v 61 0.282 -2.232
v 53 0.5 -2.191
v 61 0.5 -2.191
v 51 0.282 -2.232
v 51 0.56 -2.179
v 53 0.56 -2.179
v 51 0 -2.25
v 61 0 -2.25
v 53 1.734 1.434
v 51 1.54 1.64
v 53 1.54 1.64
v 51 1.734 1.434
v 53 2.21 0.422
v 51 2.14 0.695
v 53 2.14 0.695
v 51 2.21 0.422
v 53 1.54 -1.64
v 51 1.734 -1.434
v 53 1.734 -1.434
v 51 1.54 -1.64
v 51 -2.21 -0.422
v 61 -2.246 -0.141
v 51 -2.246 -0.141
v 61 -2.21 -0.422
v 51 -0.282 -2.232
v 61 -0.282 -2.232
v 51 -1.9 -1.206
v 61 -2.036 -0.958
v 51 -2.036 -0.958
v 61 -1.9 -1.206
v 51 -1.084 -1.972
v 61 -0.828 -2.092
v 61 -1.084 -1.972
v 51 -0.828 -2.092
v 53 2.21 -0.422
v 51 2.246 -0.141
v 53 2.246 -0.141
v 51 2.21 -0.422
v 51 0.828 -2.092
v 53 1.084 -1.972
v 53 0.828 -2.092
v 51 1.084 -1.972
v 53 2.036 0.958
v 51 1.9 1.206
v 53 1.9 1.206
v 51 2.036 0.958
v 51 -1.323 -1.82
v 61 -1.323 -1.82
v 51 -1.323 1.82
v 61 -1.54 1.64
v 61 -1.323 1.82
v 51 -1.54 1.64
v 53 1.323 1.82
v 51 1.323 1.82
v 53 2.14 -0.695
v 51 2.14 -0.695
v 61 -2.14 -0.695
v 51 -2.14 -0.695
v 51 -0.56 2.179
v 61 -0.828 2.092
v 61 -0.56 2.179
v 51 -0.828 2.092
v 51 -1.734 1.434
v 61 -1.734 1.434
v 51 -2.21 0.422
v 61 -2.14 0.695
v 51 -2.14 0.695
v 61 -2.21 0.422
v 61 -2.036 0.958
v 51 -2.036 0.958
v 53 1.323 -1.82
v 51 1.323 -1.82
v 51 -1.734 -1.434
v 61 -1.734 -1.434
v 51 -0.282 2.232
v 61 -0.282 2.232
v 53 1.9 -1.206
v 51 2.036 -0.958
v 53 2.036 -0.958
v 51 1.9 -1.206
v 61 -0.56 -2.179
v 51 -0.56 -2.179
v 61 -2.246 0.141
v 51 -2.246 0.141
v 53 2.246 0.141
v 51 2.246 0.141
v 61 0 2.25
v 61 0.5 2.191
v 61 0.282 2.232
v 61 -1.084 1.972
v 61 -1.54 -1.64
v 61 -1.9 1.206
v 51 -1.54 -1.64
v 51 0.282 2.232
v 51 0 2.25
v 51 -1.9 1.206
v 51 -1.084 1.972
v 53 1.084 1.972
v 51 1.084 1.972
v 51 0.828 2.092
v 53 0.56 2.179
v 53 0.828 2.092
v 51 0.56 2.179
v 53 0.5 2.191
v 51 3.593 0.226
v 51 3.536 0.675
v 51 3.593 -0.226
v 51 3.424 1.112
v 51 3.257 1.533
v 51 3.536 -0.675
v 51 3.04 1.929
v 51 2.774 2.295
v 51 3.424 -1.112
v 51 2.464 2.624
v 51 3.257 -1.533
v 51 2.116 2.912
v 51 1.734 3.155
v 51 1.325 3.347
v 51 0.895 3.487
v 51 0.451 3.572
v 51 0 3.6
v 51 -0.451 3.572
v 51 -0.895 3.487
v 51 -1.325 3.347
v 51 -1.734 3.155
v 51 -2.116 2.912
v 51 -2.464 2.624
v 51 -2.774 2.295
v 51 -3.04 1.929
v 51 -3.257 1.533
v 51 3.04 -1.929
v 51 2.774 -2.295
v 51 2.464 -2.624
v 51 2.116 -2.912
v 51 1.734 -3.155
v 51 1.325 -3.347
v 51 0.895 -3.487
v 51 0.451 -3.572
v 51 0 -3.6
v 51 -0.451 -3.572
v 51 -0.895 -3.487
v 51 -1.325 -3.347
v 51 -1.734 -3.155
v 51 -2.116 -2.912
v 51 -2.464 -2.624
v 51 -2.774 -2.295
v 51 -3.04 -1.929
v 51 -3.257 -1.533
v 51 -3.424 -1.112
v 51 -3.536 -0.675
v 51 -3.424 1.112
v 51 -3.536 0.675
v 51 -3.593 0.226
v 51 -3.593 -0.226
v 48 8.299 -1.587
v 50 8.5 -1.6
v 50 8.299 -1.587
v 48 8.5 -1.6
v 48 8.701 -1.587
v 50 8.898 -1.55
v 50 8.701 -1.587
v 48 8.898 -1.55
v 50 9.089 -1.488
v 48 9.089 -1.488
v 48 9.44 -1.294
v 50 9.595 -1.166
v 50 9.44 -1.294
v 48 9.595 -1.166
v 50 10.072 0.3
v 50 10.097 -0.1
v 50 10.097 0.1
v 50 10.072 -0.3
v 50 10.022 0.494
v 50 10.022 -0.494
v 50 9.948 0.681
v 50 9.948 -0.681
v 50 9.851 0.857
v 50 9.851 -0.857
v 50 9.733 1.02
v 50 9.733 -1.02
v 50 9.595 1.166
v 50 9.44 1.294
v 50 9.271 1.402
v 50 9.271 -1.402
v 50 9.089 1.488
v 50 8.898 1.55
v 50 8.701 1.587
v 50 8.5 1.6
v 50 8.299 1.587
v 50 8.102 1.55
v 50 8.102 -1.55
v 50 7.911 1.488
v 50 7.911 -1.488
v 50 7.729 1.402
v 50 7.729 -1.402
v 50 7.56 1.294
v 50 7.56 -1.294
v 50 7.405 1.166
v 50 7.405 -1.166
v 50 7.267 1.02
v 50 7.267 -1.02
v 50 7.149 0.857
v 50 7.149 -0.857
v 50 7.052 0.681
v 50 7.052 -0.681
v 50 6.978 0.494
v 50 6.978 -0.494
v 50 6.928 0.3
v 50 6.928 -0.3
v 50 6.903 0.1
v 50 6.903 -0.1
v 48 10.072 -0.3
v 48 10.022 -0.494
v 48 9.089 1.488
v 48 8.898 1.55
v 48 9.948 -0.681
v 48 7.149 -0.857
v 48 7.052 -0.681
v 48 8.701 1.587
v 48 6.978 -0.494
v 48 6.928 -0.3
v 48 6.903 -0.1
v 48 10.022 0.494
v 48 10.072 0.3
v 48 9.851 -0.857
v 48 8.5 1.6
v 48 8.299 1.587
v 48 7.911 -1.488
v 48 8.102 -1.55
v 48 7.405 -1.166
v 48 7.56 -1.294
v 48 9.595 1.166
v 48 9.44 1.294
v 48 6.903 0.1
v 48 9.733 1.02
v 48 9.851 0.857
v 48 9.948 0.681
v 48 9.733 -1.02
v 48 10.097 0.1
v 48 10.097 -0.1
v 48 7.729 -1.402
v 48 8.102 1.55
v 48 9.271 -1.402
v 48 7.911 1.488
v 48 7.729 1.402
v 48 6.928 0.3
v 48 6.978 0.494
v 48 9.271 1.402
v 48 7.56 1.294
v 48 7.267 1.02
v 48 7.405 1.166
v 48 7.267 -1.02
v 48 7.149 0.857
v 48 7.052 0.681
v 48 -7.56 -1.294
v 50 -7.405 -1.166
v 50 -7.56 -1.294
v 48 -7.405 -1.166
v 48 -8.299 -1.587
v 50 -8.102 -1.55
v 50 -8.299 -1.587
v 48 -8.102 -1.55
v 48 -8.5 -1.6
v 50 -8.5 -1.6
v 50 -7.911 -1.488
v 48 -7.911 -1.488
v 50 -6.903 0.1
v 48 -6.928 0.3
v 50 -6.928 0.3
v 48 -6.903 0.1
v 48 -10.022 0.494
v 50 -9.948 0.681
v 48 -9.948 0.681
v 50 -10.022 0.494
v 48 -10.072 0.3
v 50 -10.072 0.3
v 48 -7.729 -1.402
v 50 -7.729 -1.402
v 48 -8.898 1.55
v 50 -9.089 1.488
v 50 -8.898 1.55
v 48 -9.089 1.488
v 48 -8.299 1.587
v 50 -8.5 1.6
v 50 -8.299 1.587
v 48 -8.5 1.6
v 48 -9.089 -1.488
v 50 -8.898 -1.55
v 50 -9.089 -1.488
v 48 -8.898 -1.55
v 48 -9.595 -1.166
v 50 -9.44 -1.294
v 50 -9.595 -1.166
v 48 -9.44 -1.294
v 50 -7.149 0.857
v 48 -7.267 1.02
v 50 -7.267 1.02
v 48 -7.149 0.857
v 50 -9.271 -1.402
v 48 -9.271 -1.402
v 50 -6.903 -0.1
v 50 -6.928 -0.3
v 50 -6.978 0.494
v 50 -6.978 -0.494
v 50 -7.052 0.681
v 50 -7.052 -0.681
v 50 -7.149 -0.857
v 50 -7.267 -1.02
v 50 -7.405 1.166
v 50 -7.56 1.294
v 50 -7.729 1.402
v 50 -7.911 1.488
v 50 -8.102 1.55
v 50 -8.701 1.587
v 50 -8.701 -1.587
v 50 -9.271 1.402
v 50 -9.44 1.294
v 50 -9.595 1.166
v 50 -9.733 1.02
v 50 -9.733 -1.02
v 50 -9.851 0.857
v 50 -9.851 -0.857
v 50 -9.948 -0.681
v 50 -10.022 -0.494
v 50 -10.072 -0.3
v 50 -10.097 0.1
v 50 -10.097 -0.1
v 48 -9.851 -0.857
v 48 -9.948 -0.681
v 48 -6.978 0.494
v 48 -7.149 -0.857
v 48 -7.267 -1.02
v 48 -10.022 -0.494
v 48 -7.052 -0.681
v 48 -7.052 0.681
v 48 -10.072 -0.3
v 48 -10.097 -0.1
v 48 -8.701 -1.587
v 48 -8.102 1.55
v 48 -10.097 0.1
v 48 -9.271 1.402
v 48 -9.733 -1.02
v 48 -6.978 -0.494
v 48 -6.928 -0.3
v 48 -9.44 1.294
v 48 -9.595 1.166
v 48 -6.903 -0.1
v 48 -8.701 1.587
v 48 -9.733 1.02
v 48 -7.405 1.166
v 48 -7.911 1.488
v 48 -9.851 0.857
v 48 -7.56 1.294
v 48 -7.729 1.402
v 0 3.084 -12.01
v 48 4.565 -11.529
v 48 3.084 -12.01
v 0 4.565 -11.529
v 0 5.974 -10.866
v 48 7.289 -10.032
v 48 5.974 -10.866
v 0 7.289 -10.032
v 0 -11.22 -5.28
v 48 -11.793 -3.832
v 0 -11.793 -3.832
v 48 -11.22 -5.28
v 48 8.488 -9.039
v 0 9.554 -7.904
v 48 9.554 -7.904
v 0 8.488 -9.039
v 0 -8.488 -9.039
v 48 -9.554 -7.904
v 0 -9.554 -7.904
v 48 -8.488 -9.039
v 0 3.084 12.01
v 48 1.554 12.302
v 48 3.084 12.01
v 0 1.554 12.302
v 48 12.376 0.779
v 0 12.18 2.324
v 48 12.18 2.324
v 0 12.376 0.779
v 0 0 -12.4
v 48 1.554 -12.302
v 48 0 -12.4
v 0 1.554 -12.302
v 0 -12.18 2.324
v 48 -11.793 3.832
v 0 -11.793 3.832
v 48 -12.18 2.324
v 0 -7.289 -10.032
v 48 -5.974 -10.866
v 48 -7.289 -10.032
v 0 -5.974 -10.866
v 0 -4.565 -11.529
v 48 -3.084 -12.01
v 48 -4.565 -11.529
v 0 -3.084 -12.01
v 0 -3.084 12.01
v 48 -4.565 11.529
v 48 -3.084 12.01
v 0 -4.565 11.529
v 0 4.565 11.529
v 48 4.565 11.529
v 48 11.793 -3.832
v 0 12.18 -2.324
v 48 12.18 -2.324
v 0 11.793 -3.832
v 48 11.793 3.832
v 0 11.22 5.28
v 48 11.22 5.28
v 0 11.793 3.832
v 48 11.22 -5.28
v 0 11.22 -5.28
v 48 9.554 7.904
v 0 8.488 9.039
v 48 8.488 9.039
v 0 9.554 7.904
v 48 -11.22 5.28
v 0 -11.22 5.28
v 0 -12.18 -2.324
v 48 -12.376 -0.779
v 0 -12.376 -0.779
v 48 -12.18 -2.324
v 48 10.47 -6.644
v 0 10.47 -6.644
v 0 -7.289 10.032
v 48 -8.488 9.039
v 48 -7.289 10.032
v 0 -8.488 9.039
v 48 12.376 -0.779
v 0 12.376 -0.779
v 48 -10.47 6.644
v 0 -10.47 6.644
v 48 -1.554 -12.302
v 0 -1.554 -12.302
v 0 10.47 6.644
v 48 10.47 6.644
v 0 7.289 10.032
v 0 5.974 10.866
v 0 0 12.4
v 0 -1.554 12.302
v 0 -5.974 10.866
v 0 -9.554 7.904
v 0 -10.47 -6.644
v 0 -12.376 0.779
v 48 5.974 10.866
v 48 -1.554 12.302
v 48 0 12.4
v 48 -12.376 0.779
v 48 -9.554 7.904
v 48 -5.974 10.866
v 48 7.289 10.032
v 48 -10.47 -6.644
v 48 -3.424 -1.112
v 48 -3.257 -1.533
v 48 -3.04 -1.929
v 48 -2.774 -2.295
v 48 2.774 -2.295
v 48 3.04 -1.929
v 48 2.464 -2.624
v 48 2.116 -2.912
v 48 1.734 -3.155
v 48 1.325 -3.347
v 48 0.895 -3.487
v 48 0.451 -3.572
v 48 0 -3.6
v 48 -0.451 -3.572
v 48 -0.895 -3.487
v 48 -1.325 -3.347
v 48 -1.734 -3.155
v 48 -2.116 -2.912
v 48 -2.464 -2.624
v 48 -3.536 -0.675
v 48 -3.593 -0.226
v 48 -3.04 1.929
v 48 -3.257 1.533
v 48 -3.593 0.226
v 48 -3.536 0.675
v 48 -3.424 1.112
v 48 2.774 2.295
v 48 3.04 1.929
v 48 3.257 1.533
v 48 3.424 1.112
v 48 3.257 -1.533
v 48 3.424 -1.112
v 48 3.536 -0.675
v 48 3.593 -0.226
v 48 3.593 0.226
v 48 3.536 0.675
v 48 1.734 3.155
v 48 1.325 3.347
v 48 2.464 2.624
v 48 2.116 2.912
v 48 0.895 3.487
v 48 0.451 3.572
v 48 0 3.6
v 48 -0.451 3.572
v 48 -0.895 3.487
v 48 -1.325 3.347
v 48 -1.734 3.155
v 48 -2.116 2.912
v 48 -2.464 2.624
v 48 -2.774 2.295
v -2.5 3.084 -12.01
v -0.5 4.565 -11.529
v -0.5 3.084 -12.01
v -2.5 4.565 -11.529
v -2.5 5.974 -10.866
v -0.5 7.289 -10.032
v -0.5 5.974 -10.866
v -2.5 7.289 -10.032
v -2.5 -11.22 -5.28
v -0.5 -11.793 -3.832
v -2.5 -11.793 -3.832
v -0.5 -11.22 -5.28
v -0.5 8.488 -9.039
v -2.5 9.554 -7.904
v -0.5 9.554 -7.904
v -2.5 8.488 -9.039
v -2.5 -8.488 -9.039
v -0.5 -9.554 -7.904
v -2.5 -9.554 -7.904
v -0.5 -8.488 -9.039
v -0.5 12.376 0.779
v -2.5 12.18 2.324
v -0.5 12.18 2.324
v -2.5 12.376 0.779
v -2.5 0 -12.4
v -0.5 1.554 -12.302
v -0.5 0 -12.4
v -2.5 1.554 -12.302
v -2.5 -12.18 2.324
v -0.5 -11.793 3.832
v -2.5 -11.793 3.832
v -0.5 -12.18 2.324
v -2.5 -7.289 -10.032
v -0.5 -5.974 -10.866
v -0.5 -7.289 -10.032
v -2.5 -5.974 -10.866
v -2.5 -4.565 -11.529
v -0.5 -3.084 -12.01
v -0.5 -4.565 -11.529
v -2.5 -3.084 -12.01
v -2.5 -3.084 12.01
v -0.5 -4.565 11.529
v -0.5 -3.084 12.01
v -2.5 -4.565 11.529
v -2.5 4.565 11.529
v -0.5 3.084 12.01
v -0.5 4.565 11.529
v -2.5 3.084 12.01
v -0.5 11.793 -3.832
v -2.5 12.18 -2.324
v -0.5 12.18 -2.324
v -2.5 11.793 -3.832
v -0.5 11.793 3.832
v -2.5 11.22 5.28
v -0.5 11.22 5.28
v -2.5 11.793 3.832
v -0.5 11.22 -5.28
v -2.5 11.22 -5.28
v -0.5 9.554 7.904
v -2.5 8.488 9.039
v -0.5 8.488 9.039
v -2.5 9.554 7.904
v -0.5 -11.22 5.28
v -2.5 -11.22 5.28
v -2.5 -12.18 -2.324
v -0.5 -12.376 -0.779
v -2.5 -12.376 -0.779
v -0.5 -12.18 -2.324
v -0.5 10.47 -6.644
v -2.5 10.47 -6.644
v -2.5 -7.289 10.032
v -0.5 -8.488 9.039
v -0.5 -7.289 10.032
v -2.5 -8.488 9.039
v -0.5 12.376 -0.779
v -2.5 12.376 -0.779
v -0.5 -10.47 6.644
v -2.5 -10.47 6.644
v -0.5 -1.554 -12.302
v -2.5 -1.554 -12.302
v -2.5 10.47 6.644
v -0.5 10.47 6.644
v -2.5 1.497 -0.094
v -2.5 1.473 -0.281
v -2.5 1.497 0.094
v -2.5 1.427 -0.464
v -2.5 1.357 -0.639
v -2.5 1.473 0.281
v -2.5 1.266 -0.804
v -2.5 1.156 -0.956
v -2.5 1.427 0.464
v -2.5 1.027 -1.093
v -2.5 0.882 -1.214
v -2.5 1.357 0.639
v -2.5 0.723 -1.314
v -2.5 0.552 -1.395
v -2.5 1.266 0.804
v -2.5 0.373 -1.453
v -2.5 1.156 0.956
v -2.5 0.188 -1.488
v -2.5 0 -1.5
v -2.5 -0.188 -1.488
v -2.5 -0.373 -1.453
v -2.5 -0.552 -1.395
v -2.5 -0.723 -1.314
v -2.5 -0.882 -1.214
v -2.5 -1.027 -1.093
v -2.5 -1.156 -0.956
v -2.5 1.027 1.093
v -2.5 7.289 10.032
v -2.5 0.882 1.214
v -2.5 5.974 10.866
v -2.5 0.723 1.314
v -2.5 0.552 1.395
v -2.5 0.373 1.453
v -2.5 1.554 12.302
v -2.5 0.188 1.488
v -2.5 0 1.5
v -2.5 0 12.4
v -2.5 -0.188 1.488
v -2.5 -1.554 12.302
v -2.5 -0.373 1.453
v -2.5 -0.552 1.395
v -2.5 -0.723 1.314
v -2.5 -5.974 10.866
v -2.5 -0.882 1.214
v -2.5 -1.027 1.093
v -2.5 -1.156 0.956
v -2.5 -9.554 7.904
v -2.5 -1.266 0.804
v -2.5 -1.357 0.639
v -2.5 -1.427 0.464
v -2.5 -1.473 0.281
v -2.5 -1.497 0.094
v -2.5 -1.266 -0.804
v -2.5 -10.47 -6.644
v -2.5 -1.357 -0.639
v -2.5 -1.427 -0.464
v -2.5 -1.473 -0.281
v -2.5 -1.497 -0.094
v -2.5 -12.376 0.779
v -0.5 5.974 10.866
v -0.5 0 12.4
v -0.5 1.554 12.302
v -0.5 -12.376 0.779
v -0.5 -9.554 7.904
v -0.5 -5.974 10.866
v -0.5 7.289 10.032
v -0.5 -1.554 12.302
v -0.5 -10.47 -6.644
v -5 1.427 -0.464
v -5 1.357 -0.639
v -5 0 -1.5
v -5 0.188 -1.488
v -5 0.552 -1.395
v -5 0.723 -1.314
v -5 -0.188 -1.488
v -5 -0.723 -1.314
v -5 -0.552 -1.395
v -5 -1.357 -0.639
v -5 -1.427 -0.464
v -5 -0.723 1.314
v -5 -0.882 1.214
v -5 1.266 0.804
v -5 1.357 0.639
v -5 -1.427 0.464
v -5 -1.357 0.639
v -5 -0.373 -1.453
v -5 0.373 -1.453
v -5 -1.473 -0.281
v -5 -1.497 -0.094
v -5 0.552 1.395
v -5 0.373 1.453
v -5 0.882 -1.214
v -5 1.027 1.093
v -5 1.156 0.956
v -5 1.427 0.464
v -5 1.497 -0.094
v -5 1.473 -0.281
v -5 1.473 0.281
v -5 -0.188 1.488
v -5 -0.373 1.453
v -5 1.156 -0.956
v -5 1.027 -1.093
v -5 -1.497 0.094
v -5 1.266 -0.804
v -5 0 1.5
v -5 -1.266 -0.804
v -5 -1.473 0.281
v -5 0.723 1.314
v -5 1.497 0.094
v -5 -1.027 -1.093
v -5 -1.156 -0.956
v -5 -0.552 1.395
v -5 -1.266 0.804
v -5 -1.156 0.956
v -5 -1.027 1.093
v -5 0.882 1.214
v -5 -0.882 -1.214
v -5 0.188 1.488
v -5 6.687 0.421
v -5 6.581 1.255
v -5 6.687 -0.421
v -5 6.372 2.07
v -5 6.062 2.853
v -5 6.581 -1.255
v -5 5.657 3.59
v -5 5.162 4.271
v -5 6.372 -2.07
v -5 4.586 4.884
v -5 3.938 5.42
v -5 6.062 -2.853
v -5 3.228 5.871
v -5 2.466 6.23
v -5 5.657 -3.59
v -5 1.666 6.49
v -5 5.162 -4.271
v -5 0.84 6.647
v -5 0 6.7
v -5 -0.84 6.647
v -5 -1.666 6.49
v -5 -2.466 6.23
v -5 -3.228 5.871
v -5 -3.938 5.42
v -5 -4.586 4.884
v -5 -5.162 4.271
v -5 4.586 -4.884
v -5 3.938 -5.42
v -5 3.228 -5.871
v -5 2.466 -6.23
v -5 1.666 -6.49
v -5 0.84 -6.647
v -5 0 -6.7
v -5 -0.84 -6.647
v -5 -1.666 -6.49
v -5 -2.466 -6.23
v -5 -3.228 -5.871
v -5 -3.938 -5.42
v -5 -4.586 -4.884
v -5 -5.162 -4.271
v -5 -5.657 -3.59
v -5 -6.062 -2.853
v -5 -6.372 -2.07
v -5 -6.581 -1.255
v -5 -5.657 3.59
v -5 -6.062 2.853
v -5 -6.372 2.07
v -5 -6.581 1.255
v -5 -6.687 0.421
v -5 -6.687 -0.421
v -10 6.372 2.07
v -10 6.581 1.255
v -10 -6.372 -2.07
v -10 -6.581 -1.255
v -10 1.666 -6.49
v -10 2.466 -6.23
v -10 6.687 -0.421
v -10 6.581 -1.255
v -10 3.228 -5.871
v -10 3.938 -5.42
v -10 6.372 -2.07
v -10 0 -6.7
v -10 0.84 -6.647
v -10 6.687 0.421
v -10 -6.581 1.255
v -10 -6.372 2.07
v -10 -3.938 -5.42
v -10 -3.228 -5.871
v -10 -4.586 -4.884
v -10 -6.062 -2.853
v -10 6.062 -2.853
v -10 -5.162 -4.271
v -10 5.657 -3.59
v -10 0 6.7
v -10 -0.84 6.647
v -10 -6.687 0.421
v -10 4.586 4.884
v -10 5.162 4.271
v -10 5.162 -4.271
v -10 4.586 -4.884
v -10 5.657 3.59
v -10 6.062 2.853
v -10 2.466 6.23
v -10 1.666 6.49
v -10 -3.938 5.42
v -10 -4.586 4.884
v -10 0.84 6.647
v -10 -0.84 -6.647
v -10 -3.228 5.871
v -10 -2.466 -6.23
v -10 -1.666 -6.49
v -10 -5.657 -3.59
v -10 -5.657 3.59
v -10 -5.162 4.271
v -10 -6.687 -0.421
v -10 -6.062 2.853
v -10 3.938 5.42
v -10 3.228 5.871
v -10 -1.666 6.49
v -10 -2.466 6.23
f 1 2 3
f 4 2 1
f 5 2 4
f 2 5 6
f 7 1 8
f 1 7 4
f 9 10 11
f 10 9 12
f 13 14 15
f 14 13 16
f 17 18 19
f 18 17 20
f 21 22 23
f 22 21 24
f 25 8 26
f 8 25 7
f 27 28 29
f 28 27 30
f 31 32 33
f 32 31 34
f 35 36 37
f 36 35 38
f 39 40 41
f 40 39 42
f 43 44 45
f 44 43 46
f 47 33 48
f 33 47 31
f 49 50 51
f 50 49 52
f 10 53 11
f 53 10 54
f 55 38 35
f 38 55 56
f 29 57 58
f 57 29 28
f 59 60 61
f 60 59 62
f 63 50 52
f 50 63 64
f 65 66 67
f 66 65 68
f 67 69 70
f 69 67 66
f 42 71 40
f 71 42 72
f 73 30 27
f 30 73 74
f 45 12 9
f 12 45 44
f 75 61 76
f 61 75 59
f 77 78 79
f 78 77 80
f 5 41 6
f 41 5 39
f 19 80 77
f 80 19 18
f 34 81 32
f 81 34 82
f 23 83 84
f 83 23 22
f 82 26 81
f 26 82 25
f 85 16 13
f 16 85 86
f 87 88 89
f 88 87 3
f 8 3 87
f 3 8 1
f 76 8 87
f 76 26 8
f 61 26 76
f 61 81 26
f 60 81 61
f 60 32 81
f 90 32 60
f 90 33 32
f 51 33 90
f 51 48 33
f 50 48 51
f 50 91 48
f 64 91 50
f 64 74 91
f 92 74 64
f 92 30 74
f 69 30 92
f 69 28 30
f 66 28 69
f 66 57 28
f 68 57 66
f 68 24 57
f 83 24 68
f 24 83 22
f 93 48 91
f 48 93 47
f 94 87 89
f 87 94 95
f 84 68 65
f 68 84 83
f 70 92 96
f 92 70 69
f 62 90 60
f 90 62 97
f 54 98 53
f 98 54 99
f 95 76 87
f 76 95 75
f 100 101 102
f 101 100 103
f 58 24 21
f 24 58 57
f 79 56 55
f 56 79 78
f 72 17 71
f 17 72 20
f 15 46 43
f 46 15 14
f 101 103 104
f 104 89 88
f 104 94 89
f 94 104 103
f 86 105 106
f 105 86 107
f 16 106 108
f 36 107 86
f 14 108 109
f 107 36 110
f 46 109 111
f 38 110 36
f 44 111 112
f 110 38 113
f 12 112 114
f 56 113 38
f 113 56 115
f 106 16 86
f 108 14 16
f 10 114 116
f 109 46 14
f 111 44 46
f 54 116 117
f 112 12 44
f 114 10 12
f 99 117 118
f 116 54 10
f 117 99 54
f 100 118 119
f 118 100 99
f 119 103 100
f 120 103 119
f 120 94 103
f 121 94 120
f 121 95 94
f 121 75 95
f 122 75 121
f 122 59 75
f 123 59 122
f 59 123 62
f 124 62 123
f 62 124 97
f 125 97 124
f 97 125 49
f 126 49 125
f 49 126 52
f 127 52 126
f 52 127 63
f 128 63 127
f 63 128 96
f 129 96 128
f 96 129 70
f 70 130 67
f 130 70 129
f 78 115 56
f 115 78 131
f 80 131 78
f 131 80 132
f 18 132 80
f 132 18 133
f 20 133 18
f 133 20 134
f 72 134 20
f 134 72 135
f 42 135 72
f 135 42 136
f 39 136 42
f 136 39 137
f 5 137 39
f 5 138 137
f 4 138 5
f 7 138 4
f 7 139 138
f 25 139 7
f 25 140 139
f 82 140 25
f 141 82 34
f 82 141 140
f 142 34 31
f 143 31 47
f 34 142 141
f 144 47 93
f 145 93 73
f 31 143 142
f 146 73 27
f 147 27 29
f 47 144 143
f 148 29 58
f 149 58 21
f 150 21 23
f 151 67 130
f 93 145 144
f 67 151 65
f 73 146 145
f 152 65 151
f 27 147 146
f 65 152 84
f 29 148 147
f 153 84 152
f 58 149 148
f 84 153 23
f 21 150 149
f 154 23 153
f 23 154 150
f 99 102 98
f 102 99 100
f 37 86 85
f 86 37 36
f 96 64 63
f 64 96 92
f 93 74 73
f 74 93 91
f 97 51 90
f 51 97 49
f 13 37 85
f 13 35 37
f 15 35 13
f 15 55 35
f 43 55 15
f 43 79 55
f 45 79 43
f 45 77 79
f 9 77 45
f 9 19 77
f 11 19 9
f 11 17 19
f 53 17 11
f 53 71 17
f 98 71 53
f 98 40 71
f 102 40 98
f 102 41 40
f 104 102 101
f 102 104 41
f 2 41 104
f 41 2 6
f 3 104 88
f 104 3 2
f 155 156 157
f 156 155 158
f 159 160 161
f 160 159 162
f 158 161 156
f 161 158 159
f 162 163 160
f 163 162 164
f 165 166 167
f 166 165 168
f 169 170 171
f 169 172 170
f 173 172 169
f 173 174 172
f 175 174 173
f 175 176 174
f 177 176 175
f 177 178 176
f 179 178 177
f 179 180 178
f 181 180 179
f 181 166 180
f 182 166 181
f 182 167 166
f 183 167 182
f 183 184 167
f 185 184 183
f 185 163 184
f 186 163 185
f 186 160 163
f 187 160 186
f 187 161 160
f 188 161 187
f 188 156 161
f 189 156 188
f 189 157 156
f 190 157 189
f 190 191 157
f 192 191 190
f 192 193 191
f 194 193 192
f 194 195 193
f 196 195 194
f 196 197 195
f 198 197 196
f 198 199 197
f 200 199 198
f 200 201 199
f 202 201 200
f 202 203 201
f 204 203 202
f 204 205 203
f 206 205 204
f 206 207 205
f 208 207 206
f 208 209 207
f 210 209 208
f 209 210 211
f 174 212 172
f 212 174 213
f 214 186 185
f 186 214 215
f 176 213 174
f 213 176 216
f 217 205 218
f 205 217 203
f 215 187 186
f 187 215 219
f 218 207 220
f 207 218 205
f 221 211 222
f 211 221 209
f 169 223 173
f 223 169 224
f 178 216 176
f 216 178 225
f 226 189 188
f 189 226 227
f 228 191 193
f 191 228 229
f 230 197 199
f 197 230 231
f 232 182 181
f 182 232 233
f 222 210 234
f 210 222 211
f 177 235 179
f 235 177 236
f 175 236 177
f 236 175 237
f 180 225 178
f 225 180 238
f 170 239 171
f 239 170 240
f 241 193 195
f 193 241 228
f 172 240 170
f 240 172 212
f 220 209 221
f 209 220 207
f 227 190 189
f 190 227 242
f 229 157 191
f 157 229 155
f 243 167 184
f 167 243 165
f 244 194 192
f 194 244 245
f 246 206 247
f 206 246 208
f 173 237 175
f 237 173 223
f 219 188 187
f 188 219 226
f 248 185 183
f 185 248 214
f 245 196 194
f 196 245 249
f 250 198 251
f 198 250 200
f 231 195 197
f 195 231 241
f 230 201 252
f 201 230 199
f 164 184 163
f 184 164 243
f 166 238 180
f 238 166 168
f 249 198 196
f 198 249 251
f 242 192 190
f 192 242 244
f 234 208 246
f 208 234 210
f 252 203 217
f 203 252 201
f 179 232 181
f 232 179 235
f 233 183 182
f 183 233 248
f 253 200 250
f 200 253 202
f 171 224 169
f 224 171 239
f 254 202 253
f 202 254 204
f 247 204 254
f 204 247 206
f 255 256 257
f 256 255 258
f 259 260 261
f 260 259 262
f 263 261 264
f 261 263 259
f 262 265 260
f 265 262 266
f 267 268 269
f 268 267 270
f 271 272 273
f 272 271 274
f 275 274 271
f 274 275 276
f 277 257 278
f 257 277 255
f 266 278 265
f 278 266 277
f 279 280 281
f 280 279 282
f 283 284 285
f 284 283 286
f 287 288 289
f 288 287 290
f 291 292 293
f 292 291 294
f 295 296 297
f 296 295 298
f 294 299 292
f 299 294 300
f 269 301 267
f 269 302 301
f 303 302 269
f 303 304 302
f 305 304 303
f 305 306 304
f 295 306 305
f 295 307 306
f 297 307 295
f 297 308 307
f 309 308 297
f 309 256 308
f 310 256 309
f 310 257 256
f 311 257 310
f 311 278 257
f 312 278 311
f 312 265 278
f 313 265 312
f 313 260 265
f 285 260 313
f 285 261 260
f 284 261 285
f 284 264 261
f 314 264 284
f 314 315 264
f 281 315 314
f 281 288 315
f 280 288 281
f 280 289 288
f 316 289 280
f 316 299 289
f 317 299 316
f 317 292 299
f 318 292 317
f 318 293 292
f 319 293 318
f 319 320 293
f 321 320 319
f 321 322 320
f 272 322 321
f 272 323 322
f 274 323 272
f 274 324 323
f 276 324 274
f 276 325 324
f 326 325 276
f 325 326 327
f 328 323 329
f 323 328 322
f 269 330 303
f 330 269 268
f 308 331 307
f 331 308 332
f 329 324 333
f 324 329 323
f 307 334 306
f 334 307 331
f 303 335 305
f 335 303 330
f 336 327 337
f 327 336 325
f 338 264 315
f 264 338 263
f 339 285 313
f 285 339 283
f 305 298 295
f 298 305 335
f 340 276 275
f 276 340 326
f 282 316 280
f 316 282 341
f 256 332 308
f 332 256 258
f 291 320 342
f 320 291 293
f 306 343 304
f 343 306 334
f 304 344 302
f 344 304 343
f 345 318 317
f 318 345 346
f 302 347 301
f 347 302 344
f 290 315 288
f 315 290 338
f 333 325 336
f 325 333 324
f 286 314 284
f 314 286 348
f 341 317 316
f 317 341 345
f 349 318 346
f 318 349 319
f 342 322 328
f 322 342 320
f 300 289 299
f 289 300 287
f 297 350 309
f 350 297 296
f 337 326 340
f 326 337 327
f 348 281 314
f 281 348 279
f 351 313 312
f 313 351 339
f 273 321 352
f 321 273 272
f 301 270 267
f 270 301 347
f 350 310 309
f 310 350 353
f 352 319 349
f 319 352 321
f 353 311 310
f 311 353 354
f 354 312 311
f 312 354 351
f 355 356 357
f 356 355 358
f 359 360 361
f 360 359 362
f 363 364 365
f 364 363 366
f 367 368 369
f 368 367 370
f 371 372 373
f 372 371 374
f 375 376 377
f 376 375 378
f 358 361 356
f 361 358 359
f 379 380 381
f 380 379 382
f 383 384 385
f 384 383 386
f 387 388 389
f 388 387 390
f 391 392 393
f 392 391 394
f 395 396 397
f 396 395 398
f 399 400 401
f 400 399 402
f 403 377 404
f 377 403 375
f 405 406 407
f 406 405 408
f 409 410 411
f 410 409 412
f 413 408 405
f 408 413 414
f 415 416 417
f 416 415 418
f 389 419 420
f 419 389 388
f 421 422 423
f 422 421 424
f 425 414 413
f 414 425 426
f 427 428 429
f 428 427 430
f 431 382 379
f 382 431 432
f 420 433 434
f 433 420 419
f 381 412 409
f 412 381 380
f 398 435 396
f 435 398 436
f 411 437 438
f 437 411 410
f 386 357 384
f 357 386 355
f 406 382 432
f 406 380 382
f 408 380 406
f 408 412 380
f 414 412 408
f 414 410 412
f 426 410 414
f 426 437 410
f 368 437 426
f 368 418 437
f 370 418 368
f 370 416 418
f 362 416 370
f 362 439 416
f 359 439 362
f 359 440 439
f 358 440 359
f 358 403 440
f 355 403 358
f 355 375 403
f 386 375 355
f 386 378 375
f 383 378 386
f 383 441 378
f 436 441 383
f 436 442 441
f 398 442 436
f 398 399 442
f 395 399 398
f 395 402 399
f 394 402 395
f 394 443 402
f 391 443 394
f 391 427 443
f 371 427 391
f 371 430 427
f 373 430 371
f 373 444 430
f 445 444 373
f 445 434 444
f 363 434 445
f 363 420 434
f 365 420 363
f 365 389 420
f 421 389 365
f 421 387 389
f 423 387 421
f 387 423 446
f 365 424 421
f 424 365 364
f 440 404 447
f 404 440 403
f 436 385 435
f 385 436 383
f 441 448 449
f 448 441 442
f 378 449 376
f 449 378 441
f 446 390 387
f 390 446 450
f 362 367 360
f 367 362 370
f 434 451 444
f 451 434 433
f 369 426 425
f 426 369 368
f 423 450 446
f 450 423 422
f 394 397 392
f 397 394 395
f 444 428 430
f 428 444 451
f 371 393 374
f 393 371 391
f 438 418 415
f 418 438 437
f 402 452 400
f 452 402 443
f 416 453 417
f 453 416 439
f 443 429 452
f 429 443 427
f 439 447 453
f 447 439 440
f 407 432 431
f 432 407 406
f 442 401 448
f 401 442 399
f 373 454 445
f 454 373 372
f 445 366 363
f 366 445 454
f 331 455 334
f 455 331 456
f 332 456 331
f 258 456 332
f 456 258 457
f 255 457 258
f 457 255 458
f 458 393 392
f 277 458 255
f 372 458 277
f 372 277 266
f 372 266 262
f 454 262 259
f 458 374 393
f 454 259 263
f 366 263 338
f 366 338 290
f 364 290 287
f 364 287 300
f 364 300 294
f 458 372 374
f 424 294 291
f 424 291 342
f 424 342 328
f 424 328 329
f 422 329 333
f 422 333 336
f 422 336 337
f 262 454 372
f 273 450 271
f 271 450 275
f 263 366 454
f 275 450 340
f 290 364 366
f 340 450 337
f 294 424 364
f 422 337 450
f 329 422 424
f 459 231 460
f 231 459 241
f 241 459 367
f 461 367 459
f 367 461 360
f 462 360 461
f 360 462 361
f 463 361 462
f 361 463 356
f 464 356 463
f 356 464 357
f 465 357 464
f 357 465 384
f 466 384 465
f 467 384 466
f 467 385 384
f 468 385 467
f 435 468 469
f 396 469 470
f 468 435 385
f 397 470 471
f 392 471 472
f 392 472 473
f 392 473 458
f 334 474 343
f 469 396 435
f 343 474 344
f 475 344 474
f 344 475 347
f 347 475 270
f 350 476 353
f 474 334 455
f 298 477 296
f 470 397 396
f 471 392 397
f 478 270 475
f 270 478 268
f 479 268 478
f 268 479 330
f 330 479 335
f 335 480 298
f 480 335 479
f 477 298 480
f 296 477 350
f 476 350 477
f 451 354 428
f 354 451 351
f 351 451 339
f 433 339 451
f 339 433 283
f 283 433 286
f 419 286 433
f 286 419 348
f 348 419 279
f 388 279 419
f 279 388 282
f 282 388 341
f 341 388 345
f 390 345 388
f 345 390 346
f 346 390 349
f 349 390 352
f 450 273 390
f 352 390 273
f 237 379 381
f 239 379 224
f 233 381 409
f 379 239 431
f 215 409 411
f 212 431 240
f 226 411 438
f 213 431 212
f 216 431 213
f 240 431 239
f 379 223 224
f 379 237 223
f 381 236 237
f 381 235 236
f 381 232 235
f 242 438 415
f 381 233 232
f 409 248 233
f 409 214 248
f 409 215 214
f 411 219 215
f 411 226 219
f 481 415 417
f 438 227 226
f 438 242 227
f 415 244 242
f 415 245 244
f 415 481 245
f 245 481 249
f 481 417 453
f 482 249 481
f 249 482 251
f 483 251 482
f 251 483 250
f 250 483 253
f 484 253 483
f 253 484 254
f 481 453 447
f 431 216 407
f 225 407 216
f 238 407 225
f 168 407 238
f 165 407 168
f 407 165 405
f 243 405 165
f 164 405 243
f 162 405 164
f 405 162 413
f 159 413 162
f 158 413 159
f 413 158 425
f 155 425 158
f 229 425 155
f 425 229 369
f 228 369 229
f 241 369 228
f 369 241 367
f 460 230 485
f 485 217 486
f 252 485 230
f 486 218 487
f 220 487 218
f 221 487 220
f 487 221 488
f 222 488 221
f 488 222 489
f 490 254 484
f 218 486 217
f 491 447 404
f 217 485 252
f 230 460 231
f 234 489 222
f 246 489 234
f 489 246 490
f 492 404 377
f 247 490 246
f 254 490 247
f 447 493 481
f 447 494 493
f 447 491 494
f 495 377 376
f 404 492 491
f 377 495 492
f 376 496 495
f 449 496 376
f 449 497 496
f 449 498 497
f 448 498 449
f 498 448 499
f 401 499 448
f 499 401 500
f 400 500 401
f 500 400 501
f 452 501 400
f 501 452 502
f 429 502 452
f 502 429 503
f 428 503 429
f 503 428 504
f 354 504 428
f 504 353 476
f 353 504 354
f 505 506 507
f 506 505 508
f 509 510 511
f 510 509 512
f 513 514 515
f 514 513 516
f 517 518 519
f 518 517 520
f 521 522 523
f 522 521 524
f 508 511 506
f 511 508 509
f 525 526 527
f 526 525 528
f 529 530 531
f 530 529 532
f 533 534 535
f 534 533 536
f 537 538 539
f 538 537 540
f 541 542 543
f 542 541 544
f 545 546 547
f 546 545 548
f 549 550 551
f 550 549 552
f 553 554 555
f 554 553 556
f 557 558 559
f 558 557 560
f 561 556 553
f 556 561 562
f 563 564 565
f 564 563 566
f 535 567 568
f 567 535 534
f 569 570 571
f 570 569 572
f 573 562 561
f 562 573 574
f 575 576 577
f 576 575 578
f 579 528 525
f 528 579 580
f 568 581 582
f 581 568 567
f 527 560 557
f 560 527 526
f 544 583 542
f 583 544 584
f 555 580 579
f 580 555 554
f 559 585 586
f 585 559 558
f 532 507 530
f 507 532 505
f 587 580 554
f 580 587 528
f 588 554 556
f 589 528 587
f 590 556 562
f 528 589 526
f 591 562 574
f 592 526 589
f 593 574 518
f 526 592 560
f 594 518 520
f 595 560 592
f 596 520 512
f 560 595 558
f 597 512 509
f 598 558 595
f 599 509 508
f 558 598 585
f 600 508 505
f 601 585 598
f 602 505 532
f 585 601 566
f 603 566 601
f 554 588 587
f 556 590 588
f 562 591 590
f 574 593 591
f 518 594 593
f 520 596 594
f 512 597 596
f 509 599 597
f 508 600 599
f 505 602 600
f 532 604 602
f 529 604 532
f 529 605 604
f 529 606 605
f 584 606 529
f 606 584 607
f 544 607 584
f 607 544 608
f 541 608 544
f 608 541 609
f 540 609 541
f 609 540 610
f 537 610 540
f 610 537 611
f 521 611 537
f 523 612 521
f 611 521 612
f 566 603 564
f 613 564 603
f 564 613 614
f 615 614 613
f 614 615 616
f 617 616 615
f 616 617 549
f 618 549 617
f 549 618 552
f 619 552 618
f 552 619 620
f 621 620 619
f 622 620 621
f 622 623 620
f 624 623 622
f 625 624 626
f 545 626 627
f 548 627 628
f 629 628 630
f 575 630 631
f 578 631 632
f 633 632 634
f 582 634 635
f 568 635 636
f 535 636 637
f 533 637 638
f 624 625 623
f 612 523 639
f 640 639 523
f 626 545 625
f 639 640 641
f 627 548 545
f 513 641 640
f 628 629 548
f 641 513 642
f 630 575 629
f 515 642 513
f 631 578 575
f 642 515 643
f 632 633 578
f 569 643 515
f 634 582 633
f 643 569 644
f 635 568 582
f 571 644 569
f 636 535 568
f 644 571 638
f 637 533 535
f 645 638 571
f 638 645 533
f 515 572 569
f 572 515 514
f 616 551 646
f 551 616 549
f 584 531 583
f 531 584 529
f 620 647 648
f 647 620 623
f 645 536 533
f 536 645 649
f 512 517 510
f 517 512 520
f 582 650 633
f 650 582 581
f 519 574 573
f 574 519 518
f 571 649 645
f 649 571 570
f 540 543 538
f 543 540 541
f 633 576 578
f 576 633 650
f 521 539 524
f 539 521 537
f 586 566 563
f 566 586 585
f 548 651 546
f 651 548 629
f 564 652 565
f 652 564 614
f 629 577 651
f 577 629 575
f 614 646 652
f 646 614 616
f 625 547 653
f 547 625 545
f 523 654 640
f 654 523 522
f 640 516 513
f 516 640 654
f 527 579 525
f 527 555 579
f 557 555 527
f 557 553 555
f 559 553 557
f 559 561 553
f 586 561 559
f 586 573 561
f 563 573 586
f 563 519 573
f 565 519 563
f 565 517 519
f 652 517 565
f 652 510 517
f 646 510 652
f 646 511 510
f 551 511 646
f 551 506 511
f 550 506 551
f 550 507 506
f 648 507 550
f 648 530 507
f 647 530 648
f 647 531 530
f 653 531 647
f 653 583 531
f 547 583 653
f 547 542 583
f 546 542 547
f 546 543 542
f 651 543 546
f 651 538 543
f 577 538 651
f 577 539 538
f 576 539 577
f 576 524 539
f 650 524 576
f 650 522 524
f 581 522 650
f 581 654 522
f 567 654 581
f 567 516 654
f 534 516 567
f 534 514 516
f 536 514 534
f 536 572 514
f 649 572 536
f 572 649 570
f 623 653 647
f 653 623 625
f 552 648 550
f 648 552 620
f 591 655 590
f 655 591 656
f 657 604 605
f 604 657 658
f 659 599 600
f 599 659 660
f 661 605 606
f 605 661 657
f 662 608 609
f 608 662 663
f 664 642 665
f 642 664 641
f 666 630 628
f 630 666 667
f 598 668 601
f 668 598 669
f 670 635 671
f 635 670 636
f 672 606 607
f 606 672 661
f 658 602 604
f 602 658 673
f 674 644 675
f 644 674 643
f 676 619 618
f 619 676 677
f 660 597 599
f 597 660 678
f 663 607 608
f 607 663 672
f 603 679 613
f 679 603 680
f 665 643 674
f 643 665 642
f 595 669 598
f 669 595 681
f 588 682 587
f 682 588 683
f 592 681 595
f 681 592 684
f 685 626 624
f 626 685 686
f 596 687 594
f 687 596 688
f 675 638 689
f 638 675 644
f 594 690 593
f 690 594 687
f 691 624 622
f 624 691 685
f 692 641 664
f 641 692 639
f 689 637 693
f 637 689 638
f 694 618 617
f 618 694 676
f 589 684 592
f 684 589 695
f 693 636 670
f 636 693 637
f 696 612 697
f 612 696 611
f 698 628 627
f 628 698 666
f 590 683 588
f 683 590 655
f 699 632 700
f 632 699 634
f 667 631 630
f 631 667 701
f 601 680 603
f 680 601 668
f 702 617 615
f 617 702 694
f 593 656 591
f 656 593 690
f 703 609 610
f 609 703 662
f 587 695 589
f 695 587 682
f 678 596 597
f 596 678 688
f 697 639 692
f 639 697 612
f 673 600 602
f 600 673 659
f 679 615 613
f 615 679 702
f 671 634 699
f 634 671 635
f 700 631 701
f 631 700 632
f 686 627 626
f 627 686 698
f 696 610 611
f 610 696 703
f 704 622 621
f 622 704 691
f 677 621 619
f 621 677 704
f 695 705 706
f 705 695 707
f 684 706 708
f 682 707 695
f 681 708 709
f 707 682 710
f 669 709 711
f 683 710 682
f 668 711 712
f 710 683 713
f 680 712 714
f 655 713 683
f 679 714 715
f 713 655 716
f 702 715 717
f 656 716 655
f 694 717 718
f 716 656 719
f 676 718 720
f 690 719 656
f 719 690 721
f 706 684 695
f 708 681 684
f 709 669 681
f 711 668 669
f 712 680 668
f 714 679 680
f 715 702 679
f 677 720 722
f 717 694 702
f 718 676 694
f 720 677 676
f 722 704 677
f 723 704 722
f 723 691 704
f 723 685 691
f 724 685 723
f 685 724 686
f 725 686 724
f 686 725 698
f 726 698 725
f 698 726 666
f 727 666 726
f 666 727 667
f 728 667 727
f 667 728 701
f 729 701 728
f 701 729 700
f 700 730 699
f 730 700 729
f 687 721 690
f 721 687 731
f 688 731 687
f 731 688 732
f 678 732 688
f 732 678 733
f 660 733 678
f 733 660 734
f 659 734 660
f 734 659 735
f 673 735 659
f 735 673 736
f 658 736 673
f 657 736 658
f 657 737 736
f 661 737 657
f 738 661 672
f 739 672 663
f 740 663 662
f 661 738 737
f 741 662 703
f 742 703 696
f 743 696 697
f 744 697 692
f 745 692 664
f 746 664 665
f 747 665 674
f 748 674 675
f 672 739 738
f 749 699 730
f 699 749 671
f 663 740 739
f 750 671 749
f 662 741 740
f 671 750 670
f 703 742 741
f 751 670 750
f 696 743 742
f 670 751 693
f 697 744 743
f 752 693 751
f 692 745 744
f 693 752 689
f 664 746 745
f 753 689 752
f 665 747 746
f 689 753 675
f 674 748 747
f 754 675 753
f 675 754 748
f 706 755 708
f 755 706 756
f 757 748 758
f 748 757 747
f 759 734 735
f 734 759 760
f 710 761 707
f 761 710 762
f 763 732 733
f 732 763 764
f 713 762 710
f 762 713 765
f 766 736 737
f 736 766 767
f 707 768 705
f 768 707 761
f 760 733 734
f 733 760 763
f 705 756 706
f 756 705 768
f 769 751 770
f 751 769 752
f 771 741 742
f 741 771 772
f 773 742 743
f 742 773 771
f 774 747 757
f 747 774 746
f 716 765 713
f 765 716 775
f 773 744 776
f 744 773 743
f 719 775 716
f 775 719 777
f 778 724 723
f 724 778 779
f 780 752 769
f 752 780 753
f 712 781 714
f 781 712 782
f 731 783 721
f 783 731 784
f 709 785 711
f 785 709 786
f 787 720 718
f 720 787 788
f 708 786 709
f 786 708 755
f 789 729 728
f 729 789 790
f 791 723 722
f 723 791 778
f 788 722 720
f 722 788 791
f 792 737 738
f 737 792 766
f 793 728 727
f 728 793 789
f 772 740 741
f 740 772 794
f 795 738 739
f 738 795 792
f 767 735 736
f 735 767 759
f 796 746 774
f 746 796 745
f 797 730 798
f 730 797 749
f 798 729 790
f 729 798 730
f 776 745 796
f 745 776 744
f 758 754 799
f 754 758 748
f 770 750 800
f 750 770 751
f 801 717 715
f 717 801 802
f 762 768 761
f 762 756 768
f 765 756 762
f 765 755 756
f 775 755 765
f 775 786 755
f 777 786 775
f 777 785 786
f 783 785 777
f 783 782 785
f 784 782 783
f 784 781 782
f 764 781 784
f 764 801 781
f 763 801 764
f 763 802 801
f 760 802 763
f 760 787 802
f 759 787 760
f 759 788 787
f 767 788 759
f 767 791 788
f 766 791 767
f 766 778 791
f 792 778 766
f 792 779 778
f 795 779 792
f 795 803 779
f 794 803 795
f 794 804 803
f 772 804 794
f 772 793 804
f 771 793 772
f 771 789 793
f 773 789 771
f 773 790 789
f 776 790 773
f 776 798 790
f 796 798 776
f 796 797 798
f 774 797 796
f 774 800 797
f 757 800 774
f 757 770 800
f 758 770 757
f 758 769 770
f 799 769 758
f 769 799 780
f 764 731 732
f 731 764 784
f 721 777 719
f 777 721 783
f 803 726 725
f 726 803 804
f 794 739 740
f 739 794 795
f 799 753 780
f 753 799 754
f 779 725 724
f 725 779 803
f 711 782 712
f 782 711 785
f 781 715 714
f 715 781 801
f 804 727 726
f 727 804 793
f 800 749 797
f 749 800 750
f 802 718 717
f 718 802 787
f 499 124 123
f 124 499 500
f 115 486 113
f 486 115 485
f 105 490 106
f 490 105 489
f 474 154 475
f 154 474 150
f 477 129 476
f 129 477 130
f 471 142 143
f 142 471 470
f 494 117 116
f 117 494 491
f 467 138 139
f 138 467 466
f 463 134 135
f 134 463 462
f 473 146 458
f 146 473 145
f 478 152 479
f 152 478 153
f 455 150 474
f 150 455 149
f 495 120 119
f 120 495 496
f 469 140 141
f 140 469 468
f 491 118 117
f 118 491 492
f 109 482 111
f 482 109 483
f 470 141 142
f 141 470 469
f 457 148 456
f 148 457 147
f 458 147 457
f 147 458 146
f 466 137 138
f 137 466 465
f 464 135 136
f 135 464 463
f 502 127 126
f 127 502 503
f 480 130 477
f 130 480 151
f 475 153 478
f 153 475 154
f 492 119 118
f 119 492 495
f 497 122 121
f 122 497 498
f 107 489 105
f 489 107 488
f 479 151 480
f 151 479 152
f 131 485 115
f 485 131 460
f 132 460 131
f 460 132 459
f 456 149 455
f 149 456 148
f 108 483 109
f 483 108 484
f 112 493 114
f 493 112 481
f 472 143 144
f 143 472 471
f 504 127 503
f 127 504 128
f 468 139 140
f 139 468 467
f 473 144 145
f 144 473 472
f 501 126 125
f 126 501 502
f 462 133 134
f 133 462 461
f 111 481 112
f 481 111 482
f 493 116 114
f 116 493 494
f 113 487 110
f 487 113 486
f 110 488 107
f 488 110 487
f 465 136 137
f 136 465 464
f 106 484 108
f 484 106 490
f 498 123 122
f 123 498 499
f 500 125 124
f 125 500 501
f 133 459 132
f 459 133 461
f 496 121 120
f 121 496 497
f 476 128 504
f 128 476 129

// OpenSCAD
// file: ../robot_settings.scad
main_box_x = 95.5; // 96
main_box_y = 102;
main_box_z = 74; // 74.5
wall_thickness = 2;

rail_gap = 2;
rail_inset = 7;

rail_thickness = 7;
rail_length = 250;
rail_width = 200;

raspberry_pi_screw_seperation_y = 57;
raspberry_pi_screw_seperation_z = 48;
raspberry_pi_peg_h = 8;

gears_module = 1;
pinion_gear_teeth = 30;
pinion_gear_width = 5;
pinion_gear_bore = 4;

gears_setback_distance = 25;
gear_post_height = 2 * pinion_gear_width + rail_thickness + 8 ;

steering_motor_mount_x = 45;
steering_motor_mount_y = 36;
steering_motor_mount_z = 18;
steering_motor_mount_setback_distance = gears_setback_distance + 16;

dc_motor_housing_minus_encoder_z = 48;
dc_motor_encoder_z = 9.33;
dc_motor_encoder_wheel_d = 13.4;
dc_motor_encoder_wheel_thickness = 5;
dc_motor_encoder_wheel_gap = 3;
dc_motor_encoder_circuit_thickness = 2;
dc_motor_cutout_d = 24.8;
dc_motor_cutout_z = 19.5;

dc_motor_screw_head_z = 2;
dc_motor_screw_head_d = 5.6;
dc_motor_screw_d = 3.2;
dc_motor_screw_offset = 8.5;

dc_motor_axle_ring_z = 3;
dc_motor_axle_ring_d = 7.2;
dc_motor_axle_cutout_d = 4.5;
dc_motor_axle_cutout_z = 10;
dc_motor_axle_notch_cutout = 0.5;
dc_motor_axle_notch_cutout_z = 6;

steering_shaft_z = gear_post_height + dc_motor_axle_ring_z + pinion_gear_width + 15;
steering_shaft_d = 7;
steering_shaft_motor_fitting_d = 9;

lidar_mount_y = 125;
lidar_mount_x = 65;

ball_bearing_height = 7;
ball_bearing_outer_diameter = 22;
ball_bearing_inner_diameter = 8;

pull_bar_radius = 3.3;

rack_module = 1;
rack_length = main_box_x / 2;
rack_height = 10;
rack_width = 10;
rack_teeth = 30;
rack_bore = 3;

// tire hardware
axle_reciever_inner_diameter = 7.75;
axle_reciever_length = 18.8;
axle_notch_length = 7;
axle_notch_cutout = 2.4;
// main file
  include <../robot_settings.scad>      
  $fn = 50;
  
module dc_motor
(
)

{        
        rotate([0,90,0])
        cylinder(h = dc_motor_housing_minus_encoder_z, d = dc_motor_cutout_d);
      
      translate([
        -dc_motor_encoder_circuit_thickness - .5, 
        0, 
        0
        ])
        rotate([0,90,0])
       cylinder(h = dc_motor_encoder_circuit_thickness, d = dc_motor_cutout_d);
      
      translate([
        -dc_motor_encoder_circuit_thickness - dc_motor_encoder_wheel_gap, 
        0, 
        0
        ])
        rotate([0,90.0])
        cylinder(h = dc_motor_encoder_wheel_gap, d = 3);
        
      translate([
        -dc_motor_encoder_circuit_thickness - dc_motor_encoder_wheel_gap - dc_motor_encoder_wheel_thickness,
        0,
        0])
        rotate([0,90,0])
        cylinder(h = dc_motor_encoder_wheel_thickness, d = dc_motor_encoder_wheel_d);
        
        translate([
          dc_motor_housing_minus_encoder_z, 0, 0
        ])
        rotate([0,90,0])
          cylinder(h = dc_motor_axle_ring_z, d = dc_motor_axle_ring_d);
          
        translate([
          dc_motor_housing_minus_encoder_z + dc_motor_axle_ring_z,
          0,
          0
        ])
        rotate([0,90,0])
        {
          difference() {
            cylinder(h = dc_motor_axle_cutout_z, d = dc_motor_axle_cutout_d);          
             // axle notch
            translate([
              -3, 
              dc_motor_axle_notch_cutout,
              dc_motor_axle_cutout_z - axle_notch_length - 1
            ])
            cube([
              axle_notch_length , 
              axle_reciever_inner_diameter / 2, 
              dc_motor_axle_cutout_z]);
          }
          
          // screw holes
          color("blue")
          translate([0, dc_motor_screw_offset, - dc_motor_axle_ring_z - 1])
          cylinder(h = 3, d = dc_motor_screw_d);
          
          color("blue")         
          translate([0, -dc_motor_screw_offset, - dc_motor_axle_ring_z - 1])
          cylinder(h = 3, d = dc_motor_screw_d);
   
       }
}
dc_motor();
